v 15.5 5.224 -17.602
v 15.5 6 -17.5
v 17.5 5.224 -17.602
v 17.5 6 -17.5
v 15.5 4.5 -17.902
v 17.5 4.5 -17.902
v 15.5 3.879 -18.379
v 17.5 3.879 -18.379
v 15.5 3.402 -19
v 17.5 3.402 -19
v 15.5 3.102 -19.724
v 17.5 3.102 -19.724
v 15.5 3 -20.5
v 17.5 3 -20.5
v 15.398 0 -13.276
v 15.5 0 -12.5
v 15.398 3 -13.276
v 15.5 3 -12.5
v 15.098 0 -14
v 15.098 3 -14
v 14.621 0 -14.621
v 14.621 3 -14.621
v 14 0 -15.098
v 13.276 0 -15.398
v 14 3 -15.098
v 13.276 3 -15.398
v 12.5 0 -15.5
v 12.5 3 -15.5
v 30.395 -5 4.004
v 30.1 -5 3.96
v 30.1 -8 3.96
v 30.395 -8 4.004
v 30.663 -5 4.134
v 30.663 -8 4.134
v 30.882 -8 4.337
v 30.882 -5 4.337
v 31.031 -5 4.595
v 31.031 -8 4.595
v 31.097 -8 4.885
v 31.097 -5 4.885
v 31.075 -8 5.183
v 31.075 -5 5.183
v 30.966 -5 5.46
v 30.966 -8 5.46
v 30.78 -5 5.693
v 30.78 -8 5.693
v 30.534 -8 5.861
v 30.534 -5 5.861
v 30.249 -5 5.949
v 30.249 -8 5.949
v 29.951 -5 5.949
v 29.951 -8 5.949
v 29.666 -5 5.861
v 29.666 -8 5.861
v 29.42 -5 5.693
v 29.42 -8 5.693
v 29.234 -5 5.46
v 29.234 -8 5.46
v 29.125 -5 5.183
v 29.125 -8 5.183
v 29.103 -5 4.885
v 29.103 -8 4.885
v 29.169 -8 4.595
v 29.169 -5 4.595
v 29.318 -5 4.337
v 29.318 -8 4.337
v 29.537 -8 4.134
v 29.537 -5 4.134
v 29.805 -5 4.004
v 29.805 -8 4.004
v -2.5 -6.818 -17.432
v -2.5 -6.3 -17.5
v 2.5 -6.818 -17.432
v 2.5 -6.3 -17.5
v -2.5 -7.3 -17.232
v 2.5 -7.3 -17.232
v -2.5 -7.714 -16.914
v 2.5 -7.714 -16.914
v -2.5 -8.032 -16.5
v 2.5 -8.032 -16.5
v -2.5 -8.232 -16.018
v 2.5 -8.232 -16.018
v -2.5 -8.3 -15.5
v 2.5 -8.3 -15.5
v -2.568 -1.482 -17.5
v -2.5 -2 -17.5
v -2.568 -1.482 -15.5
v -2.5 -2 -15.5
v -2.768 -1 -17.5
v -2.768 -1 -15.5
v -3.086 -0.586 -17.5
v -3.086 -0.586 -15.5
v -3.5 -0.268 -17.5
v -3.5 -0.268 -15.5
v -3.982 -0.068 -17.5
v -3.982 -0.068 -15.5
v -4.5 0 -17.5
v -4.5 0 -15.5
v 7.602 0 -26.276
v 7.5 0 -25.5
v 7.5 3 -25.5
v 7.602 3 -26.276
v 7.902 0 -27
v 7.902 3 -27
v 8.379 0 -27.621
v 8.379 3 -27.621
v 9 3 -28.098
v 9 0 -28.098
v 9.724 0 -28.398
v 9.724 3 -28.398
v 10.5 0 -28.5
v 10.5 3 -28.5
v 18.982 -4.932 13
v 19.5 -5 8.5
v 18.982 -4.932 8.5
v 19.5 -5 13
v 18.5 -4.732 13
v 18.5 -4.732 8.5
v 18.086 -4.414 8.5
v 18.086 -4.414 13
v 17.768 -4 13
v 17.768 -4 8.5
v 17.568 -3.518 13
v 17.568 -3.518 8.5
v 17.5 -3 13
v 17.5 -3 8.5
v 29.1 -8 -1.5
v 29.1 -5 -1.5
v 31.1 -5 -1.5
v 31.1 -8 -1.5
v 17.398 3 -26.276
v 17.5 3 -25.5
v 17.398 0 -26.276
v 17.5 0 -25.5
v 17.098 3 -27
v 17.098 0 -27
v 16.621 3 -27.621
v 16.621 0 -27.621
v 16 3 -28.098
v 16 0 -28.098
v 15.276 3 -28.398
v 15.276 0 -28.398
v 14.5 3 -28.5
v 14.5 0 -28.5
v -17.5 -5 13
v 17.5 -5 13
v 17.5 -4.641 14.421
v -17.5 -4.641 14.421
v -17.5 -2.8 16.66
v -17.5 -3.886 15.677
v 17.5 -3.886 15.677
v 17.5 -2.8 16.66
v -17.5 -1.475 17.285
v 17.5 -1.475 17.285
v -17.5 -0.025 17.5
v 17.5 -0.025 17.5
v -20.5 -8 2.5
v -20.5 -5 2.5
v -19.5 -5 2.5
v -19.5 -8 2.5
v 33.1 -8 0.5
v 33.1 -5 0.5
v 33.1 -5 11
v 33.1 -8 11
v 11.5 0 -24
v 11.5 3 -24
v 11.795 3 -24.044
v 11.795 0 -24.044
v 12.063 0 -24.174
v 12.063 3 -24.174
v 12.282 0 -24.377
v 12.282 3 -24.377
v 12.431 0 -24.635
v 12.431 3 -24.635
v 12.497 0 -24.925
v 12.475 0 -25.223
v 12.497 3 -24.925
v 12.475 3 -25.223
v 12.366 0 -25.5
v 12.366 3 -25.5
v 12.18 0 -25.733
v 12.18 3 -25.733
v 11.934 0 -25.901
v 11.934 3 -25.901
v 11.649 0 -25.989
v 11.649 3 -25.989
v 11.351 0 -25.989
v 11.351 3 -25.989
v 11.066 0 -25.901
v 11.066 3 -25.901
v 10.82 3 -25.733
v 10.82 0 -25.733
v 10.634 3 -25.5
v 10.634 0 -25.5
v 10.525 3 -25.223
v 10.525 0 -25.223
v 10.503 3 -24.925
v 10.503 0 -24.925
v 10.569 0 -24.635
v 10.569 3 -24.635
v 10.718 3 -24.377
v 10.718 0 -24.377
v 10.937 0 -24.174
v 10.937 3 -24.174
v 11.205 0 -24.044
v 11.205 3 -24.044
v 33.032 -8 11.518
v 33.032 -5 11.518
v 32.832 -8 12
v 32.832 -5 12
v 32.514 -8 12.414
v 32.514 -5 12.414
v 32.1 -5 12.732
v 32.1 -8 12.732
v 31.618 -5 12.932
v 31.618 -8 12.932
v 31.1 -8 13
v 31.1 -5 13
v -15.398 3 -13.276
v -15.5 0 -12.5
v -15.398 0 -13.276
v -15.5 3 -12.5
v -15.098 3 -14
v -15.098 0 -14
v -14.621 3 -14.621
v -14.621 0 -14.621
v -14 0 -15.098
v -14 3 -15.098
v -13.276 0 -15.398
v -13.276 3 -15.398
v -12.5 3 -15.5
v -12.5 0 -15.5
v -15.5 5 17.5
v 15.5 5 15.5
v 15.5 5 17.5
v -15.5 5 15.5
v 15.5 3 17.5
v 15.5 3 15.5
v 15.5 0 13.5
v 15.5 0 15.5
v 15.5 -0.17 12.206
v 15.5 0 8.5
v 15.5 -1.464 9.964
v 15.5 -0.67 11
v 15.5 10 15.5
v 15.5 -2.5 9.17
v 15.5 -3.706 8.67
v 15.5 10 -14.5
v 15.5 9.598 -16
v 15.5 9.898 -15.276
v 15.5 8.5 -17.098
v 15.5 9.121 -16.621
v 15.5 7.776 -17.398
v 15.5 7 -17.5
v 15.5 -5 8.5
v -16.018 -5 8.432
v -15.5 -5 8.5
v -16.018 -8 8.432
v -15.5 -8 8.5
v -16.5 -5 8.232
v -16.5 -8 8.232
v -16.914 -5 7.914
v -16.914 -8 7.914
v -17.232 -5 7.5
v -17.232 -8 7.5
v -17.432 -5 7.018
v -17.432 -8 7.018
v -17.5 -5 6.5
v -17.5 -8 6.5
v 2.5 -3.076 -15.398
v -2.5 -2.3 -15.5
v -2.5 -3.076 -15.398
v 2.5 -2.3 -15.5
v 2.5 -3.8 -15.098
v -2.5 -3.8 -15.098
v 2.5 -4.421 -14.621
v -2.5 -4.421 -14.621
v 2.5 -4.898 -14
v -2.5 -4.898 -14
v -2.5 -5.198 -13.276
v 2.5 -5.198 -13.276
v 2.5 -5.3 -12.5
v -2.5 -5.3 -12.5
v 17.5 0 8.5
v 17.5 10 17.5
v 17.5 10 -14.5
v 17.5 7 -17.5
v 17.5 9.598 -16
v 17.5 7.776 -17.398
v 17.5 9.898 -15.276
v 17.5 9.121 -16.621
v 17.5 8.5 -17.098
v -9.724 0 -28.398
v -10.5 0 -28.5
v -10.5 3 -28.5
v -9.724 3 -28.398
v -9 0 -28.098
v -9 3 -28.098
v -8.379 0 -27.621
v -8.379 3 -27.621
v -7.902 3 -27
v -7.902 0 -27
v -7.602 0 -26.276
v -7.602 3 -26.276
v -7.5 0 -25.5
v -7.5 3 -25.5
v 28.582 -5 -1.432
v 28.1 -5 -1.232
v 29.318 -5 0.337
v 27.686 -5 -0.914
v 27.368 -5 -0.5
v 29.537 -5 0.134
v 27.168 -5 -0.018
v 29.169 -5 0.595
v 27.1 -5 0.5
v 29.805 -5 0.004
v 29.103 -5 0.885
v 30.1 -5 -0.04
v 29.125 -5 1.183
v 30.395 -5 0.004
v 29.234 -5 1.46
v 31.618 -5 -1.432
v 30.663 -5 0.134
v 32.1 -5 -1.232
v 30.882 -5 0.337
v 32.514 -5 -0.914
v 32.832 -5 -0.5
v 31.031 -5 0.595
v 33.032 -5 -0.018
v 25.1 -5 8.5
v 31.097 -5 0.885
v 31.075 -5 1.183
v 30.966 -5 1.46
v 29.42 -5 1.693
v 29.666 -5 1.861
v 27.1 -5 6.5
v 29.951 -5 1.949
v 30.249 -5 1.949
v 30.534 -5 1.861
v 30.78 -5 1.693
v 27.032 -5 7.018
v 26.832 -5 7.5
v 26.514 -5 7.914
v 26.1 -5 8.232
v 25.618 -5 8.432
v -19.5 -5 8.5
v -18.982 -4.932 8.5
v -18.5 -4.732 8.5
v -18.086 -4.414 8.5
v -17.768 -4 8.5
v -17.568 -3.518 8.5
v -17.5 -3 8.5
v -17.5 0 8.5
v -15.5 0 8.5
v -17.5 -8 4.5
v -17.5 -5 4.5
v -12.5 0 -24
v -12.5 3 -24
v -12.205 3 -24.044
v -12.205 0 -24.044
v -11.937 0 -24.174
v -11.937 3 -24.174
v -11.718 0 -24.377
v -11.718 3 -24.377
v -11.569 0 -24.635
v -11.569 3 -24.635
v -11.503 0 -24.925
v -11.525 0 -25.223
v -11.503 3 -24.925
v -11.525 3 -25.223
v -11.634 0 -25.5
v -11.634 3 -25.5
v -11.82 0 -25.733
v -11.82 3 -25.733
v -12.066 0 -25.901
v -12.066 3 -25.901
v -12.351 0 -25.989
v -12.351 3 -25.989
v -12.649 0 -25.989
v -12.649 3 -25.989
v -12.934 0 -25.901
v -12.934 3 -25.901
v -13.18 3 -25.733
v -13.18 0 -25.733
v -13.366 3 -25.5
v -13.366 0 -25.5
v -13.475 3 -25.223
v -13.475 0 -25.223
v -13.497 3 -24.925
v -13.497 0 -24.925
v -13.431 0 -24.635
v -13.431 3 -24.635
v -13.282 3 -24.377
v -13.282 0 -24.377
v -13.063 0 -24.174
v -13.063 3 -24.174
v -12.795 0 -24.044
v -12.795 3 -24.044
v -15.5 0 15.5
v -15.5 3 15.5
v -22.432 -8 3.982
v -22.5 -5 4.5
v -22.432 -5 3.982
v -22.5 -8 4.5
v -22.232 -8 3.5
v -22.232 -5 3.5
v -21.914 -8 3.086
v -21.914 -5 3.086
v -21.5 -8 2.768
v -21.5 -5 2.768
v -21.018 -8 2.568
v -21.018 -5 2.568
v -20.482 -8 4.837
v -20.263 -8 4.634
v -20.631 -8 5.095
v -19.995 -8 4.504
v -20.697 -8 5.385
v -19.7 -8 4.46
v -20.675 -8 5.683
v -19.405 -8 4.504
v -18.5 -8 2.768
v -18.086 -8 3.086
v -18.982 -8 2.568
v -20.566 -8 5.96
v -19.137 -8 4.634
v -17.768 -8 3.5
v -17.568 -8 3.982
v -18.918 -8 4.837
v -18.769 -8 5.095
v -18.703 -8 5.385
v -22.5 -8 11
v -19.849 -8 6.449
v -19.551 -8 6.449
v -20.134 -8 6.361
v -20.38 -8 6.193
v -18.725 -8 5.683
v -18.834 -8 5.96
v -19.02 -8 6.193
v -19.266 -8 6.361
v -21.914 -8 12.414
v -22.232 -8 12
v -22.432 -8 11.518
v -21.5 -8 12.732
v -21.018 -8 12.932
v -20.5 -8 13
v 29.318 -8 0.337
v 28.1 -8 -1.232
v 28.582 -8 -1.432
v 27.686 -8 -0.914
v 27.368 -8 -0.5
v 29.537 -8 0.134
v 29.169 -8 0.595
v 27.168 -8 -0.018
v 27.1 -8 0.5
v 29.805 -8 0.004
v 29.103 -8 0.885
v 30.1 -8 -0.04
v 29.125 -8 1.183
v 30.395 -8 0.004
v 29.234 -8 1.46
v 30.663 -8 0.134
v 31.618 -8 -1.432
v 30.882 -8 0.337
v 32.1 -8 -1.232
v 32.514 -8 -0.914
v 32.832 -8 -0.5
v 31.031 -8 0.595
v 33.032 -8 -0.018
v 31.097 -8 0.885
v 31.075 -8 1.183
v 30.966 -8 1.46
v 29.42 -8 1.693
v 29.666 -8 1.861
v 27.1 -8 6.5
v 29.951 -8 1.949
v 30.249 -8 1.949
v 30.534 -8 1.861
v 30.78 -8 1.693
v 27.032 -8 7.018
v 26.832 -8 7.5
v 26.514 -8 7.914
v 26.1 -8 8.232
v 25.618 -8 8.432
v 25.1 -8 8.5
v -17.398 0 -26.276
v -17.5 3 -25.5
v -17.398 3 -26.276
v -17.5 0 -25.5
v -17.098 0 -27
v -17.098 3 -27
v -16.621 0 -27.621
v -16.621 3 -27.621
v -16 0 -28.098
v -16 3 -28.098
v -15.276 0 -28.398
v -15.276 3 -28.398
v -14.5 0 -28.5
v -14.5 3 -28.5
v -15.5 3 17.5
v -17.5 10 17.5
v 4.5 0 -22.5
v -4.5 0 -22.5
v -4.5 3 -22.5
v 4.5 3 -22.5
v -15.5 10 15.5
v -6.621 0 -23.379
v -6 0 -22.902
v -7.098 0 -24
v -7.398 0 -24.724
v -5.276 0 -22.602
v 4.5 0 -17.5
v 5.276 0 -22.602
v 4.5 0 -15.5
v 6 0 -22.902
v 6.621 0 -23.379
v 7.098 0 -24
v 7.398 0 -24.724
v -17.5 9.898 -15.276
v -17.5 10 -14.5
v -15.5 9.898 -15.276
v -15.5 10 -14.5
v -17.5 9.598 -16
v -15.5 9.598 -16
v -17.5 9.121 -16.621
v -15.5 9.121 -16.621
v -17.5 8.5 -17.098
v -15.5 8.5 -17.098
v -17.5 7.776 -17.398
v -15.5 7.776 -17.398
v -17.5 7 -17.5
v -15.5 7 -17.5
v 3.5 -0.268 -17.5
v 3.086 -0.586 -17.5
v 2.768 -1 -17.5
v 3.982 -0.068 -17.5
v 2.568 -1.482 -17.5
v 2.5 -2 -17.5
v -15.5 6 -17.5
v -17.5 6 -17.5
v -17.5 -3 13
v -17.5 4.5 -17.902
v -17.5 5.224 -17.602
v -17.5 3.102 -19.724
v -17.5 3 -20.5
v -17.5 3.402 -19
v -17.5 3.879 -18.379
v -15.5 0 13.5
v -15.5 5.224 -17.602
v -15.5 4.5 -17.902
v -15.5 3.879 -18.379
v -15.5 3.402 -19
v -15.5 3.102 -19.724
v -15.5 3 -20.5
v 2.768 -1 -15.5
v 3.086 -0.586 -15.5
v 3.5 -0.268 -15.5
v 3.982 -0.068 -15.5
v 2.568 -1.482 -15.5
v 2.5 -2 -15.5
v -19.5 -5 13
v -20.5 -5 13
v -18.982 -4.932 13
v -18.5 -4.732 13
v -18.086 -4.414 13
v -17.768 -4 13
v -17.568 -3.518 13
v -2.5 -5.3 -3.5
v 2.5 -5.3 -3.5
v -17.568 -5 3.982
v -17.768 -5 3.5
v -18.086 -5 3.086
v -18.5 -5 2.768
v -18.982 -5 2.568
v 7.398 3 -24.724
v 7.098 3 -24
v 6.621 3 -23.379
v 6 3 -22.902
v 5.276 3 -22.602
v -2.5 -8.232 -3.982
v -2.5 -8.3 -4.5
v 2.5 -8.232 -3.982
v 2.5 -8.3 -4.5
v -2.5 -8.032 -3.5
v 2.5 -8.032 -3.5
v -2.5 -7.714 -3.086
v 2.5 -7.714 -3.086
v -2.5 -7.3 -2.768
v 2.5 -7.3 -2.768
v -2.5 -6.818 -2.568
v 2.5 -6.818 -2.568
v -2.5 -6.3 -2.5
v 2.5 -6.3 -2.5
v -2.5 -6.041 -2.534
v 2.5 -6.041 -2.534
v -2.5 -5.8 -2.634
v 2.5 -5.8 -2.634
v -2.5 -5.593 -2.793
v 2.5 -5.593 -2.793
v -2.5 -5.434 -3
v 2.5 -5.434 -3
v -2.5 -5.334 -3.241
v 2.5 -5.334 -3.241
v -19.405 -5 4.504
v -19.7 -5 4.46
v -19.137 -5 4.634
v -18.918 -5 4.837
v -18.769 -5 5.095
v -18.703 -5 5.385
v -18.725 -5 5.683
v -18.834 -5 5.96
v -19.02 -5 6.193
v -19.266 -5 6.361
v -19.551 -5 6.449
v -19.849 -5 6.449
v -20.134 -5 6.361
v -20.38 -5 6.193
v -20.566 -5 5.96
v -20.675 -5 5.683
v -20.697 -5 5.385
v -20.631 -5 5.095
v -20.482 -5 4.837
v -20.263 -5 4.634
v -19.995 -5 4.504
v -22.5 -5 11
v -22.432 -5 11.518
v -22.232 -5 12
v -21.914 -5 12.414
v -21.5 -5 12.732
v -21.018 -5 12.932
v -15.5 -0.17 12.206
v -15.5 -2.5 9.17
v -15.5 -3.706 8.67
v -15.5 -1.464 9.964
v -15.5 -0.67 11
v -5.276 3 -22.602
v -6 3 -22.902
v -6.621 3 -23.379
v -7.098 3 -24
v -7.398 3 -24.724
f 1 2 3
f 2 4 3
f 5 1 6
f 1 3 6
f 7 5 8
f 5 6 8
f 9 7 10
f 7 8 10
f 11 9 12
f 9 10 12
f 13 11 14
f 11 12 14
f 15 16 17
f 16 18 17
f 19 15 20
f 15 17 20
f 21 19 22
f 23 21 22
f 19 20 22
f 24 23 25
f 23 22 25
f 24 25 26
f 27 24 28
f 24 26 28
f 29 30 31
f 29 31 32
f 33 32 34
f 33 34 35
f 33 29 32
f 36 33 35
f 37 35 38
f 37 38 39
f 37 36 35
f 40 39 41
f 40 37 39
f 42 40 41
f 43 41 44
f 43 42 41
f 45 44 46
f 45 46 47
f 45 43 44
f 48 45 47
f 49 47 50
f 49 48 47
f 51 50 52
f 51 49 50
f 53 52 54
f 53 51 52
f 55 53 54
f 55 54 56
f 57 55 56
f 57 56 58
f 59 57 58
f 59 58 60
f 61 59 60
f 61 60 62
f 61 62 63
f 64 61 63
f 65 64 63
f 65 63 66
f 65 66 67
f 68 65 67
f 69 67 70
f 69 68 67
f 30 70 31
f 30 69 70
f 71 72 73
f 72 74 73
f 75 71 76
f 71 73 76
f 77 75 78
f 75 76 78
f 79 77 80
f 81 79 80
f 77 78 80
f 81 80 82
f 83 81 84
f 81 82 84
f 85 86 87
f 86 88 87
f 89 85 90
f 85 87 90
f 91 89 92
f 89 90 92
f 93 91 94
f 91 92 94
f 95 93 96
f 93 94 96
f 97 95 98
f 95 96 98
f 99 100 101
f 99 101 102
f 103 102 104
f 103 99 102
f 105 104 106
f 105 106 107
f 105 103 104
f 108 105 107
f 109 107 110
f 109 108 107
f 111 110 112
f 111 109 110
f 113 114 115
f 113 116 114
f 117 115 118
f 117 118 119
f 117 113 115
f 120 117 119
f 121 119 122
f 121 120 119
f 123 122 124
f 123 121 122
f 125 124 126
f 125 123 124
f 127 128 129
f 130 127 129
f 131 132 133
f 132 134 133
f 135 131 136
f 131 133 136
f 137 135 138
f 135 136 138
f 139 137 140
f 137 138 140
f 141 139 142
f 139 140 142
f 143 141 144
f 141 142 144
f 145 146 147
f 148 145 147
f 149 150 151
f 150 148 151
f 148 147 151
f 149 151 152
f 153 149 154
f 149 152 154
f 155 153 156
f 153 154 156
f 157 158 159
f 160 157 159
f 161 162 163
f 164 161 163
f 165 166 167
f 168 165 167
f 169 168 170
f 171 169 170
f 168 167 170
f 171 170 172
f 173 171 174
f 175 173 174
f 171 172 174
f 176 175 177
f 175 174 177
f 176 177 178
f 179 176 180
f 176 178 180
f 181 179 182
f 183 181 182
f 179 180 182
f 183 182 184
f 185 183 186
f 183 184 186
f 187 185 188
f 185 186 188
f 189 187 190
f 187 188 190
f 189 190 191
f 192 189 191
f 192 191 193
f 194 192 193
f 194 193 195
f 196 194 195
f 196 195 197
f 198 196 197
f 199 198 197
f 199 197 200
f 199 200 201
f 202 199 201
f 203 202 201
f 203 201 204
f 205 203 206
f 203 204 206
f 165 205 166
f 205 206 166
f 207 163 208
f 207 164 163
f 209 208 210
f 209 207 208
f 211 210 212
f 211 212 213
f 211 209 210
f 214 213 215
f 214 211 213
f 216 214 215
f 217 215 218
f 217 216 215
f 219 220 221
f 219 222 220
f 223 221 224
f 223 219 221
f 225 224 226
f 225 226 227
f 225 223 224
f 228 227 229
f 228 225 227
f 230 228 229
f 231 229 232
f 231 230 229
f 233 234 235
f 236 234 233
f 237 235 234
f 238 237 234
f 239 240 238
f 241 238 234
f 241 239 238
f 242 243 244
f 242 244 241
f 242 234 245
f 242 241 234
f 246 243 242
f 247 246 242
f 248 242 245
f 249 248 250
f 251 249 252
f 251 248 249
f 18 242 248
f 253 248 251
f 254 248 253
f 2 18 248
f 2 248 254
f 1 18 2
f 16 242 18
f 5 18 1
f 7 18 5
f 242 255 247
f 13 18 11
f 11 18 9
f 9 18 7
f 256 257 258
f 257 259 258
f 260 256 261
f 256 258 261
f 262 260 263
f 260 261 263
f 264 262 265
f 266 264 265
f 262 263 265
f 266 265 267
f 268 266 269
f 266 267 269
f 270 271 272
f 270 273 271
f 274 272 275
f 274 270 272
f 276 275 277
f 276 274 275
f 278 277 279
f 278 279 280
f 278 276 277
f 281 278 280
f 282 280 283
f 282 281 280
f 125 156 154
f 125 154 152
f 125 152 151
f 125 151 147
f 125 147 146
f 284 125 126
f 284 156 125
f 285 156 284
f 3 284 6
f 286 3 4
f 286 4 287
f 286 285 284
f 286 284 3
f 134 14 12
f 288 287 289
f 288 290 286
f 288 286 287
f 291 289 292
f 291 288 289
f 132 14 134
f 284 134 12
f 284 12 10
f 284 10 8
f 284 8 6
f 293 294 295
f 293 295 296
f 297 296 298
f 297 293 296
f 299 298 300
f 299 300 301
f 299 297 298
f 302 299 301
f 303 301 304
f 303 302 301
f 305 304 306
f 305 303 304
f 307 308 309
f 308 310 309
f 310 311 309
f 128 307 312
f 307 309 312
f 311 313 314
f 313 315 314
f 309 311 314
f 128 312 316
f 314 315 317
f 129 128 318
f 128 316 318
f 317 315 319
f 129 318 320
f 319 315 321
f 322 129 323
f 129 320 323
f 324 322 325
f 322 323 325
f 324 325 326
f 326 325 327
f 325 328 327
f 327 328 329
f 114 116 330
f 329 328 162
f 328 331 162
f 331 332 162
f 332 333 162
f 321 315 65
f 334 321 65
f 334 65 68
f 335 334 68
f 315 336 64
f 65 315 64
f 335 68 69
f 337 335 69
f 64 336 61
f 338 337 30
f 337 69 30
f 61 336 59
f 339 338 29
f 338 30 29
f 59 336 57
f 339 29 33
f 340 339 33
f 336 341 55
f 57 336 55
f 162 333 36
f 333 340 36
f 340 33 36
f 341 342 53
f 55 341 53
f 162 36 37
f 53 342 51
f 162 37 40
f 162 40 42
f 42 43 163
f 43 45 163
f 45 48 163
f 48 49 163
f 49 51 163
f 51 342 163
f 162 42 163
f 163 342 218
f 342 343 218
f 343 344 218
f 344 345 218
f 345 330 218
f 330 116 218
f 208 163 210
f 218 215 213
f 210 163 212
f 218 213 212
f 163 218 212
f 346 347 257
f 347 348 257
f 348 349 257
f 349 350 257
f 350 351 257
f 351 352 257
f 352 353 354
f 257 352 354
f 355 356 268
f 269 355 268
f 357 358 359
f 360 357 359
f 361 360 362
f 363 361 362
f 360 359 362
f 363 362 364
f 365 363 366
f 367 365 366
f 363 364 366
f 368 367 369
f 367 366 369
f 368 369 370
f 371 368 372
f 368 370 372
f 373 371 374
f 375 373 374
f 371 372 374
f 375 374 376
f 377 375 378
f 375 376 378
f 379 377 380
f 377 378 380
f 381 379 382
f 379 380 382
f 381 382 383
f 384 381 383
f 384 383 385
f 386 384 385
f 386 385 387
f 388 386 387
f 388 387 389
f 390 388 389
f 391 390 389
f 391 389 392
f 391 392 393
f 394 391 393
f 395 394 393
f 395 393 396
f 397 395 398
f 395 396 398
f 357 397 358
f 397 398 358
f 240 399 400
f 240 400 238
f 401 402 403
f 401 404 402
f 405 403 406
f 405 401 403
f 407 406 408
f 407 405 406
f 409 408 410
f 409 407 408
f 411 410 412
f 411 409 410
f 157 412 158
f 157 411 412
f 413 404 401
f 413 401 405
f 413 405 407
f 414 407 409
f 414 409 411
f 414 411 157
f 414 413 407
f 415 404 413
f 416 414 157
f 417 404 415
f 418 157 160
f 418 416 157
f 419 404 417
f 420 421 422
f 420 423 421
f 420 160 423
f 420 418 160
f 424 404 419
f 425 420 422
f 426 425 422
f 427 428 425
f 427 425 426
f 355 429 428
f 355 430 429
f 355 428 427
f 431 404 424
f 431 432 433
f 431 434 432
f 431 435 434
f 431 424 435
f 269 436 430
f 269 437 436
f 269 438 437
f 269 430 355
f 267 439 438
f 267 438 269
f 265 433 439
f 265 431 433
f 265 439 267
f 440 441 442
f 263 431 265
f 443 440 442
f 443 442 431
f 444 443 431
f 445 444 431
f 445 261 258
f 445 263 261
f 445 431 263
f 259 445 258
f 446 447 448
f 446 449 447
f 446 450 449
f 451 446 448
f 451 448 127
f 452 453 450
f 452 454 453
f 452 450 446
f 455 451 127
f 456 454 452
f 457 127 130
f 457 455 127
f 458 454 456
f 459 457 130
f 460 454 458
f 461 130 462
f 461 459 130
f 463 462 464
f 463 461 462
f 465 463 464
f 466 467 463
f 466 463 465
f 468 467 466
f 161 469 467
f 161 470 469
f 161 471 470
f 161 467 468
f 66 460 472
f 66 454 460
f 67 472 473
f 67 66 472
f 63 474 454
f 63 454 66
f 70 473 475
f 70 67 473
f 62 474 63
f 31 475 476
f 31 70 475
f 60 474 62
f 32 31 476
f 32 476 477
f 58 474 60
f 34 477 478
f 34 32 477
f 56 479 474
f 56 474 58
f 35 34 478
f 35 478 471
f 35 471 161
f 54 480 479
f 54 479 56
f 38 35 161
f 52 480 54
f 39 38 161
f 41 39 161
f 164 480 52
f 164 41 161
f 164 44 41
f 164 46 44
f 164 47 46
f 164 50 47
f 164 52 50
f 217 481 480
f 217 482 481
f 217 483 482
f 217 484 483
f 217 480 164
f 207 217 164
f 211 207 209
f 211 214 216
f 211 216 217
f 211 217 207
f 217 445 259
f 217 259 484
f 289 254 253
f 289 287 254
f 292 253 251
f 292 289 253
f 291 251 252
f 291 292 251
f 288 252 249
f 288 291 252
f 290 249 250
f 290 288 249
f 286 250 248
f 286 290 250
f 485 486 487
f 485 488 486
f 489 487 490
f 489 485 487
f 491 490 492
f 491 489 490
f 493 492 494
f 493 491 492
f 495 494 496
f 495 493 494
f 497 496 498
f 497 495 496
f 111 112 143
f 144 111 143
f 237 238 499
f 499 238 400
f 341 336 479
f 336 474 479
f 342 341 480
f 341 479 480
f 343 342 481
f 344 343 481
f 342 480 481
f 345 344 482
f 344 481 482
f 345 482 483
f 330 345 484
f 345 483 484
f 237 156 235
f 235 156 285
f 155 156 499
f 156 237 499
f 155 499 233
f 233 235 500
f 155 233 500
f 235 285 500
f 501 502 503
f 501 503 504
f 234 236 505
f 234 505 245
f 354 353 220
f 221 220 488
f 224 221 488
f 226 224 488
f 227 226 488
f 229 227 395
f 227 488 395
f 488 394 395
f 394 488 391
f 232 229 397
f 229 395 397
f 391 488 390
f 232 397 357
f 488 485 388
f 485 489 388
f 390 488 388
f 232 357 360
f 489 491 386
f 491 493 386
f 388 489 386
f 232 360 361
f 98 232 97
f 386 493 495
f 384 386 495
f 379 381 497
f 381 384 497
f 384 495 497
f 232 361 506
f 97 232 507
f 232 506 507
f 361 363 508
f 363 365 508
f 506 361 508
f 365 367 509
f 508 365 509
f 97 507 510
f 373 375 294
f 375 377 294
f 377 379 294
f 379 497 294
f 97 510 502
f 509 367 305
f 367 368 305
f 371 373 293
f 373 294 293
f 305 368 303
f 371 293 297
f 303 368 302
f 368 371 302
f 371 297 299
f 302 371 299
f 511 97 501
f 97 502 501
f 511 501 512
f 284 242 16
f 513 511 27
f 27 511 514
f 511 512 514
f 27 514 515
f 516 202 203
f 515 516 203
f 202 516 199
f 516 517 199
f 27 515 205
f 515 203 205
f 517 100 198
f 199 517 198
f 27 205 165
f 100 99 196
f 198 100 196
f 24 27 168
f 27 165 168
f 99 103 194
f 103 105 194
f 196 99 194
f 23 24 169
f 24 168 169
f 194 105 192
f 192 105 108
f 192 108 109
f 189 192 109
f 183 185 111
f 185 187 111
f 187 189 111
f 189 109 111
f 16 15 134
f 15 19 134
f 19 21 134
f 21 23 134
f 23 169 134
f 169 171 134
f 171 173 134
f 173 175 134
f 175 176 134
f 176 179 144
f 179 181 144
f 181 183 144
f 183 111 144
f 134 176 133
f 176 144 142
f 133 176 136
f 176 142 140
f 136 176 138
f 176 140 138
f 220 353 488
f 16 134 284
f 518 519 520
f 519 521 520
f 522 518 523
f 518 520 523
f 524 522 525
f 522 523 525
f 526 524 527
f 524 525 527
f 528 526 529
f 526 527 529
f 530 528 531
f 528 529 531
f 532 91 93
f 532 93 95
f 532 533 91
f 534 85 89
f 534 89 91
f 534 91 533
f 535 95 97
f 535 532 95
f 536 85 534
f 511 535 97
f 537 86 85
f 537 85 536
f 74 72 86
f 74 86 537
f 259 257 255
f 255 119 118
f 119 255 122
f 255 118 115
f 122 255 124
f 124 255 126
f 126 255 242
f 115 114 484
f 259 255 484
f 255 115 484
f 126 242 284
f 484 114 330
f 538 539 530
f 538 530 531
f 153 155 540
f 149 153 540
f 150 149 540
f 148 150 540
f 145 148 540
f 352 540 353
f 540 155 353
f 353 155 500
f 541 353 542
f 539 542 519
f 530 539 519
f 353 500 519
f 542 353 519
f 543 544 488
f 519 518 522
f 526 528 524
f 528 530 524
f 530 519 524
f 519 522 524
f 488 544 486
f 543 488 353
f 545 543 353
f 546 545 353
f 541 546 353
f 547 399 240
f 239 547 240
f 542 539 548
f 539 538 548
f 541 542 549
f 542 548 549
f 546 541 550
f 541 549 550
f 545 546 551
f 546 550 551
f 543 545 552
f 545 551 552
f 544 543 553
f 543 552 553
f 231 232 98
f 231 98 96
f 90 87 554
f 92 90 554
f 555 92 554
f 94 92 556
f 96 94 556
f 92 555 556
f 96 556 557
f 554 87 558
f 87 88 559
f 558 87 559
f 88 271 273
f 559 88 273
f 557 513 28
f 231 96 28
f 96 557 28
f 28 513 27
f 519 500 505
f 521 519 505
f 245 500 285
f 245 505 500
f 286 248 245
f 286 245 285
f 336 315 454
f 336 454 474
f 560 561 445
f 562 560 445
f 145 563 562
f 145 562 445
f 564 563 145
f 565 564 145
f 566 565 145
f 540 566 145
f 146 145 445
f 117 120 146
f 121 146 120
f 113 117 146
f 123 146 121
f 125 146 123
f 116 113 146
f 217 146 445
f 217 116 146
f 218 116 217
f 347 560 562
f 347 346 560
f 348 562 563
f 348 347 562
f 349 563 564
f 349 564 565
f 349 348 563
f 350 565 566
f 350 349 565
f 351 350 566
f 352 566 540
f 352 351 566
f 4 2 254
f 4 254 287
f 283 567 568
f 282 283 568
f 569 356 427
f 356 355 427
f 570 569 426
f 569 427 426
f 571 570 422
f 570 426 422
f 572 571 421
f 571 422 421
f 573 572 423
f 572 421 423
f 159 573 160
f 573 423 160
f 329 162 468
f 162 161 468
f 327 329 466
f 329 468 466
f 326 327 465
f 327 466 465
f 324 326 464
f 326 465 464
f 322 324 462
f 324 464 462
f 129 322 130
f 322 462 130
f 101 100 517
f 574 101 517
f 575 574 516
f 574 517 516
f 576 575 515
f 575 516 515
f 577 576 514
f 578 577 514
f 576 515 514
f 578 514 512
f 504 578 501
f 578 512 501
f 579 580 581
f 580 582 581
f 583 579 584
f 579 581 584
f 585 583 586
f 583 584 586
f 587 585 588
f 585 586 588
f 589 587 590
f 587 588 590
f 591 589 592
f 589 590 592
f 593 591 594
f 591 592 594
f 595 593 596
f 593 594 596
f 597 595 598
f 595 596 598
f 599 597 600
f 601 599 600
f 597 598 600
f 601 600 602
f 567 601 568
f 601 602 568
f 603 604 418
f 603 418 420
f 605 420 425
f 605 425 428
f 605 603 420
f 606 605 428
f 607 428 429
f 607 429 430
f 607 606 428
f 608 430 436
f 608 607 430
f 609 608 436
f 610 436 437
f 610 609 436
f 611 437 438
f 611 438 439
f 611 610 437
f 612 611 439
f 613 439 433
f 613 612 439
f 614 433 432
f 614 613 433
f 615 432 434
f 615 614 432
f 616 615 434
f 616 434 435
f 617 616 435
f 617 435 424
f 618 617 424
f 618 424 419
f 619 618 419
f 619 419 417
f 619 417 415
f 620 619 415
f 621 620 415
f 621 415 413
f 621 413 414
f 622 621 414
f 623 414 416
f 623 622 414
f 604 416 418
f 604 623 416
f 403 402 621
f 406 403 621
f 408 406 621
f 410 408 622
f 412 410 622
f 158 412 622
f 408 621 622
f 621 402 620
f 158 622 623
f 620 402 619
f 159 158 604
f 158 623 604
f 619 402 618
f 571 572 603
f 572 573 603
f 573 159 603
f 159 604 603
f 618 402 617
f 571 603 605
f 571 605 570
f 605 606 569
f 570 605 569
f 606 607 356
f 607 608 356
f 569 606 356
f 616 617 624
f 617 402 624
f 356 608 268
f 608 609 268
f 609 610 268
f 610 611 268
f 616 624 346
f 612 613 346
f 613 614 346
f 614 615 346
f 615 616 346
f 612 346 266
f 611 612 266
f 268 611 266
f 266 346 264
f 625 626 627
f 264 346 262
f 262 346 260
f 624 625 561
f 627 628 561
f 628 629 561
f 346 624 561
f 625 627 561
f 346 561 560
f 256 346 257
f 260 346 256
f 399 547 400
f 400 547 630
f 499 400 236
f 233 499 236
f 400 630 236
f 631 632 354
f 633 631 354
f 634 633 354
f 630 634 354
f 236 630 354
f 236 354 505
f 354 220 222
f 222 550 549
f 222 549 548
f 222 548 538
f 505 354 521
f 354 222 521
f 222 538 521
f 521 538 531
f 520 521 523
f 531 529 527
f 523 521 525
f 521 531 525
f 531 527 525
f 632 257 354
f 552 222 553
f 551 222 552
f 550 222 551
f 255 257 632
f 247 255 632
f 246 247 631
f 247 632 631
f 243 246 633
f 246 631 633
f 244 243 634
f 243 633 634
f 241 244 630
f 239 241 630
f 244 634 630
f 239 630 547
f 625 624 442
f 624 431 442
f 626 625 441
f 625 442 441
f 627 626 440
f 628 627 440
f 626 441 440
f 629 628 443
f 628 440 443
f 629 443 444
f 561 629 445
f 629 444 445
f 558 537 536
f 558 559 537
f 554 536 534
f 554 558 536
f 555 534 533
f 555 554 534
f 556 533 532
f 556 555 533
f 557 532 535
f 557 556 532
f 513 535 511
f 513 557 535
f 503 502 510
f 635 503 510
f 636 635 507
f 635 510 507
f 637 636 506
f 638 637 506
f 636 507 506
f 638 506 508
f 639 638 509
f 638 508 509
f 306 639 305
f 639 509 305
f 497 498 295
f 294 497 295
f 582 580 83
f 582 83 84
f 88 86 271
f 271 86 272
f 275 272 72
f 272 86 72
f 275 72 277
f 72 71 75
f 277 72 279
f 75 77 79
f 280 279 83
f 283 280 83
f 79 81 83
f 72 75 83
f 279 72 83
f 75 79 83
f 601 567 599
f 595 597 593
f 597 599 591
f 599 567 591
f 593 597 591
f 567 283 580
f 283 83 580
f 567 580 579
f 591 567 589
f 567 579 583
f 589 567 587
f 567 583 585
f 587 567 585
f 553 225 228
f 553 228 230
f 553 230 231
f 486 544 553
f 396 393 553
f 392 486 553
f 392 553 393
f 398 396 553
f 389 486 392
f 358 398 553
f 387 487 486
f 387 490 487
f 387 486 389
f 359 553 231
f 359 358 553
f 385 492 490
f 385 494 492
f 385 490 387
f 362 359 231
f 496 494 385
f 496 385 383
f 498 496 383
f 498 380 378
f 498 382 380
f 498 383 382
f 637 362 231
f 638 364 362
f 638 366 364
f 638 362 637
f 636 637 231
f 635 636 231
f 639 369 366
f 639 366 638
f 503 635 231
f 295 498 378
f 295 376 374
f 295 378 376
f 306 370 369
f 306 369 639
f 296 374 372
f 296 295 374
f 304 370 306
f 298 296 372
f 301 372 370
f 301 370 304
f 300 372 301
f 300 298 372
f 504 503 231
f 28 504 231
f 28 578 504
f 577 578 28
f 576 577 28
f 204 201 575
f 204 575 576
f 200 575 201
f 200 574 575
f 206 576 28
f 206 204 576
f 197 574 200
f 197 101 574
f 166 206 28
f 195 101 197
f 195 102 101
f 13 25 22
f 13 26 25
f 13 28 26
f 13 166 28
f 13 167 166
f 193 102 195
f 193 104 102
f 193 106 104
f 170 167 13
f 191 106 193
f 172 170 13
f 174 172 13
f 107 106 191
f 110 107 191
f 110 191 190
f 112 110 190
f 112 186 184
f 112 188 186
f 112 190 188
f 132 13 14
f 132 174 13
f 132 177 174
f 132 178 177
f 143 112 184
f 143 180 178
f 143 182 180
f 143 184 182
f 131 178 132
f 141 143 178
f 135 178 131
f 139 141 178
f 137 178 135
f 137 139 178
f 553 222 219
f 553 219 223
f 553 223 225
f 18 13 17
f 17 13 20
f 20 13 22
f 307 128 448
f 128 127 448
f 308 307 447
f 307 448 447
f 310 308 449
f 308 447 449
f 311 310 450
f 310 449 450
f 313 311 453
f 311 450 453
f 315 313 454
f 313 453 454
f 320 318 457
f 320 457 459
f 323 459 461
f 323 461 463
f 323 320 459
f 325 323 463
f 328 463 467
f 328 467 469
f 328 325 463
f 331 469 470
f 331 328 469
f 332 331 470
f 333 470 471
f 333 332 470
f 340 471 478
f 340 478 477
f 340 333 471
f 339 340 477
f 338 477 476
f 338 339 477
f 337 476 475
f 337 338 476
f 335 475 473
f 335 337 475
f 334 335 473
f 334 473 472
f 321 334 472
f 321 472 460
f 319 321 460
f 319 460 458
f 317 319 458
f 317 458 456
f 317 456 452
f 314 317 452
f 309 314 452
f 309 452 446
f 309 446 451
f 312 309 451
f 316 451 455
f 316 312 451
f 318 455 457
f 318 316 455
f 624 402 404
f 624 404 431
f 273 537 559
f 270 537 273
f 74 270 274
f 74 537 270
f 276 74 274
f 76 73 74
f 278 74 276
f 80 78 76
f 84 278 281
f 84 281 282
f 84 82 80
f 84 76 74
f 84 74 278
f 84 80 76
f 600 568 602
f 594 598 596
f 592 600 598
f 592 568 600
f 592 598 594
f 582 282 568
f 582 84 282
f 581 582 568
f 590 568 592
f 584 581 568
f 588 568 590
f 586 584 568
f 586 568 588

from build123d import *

# Parameters (mm, degrees)
SKETCH_1_W          = 35
SKETCH_1_H          = 35
SKETCH_1_W_2        = 31
SKETCH_1_H_2        = 31
EXTRUDE_1_DEPTH     = 10
EXTRUDE_2_DEPTH     = 5
SKETCH_3_W          = 31
SKETCH_3_H          = 7
CUT_EXTRUDE_1_DEPTH = 3
SKETCH_4_W          = 5
SKETCH_4_H          = 4.5
SKETCH_4_W_2        = 35
SKETCH_4_H_2        = 6
SKETCH_4_R          = 1
SKETCH_4_W_3        = 6
SKETCH_4_H_3        = 10
EXTRUDE_3_DEPTH     = 3
FILLET_2_R          = 2
FILLET_3_R          = 2
SKETCH_5_W          = 5
SKETCH_5_H          = 2
EXTRUDE_4_DEPTH     = 8.3
SKETCH_6_W          = 5
SKETCH_6_H          = 13
EXTRUDE_5_DEPTH     = 3
FILLET_4_R          = 2
FILLET_5_R          = 1
FILLET_6_R          = 2
SKETCH_7_W          = 31
SKETCH_7_H          = 2
CUT_EXTRUDE_2_DEPTH = 10
FILLET_7_R          = 5
SKETCH_8_W          = 35
SKETCH_8_H          = 11
SKETCH_8_R          = 1
EXTRUDE_6_DEPTH     = 3
FILLET_8_R          = 3
FILLET_9_R          = 3
SKETCH_11_W         = 15
SKETCH_11_H         = 6
CUT_EXTRUDE_4_DEPTH = 3
FILLET_START        = -1
FILLET_10_DEPTH     = 4
FILLET_10_2_DEPTH   = 3
FILLET_11_R         = 3


with BuildPart() as part:
    # 草图1 → 凸台-拉伸1 (new body)
    with BuildSketch(Plane(origin=(0, 0, 0), x_dir=(1, 0, 0), z_dir=(0, 1, 0))):
        Rectangle(SKETCH_1_W, SKETCH_1_H)
        Rectangle(SKETCH_1_W_2, SKETCH_1_H_2, mode=Mode.SUBTRACT)
    extrude(amount=EXTRUDE_1_DEPTH)

    # 草图2 → 凸台-拉伸2 (add)
    with BuildSketch(Plane.XZ):
        Polygon((15.5, 8.5), (17.5, 8.5), (17.5, 17.5), (-17.5, 17.5), (-17.5, 8.5), align=None)
    extrude(amount=EXTRUDE_2_DEPTH)

    # 草图3 → 切除-拉伸1 (cut)
    with BuildSketch(Plane(origin=(0, 0, -17.5), x_dir=(-1, 0, 0), z_dir=(0, 0, -1))):
        with Locations((0, 6.5)):
            Rectangle(SKETCH_3_W, SKETCH_3_H)
    extrude(amount=-CUT_EXTRUDE_1_DEPTH, mode=Mode.SUBTRACT)

    # 草图4 → 凸台-拉伸3 (add)
    # profile 1 of 5: a face of its own
    with BuildSketch(Plane.XZ.offset(5)):
        with Locations((-20, 10.75)):
            Rectangle(SKETCH_4_W, SKETCH_4_H)
    # profile 2 of 5: a face of its own
    with BuildSketch(Plane.XZ.offset(5)):
        with Locations((0, 10.75)):
            Rectangle(SKETCH_4_W_2, SKETCH_4_H)
    # profile 3 of 5: a face of its own
    with BuildSketch(Plane.XZ.offset(5)):
        with Locations((-20, 5.5)):
            Rectangle(SKETCH_4_W, SKETCH_4_H_2)
        with Locations(Location((-19.7, 5.46, 0), (0, 0, 270))):
            Circle(SKETCH_4_R, mode=Mode.SUBTRACT)
    # profile 4 of 5: a face of its own
    with BuildSketch(Plane.XZ.offset(5)):
        Polygon((17.5, 13), (17.5, 8.5), (27.1, 8.5), (33.1, 8.5), (33.1, 13), align=None)
    # profile 5 of 5: a face of its own
    with BuildSketch(Plane.XZ.offset(5)):
        with Locations((30.1, 3.5)):
            Rectangle(SKETCH_4_W_3, SKETCH_4_H_3)
        with Locations(Location((30.1, 0.96, 0), (0, 0, 270))):
            Circle(SKETCH_4_R, mode=Mode.SUBTRACT)
        with Locations(Location((30.1, 4.96, 0), (0, 0, 270))):
            Circle(SKETCH_4_R, mode=Mode.SUBTRACT)
    extrude(amount=EXTRUDE_3_DEPTH)

    # 圆角2
    fillet_2_edges = [part.edges().sort_by_distance(p)[0] for p in [
        (-22.5, -6.5, 13),
        (-22.5, -6.5, 2.5),
        (-17.5, -6.5, 2.5),
        (-17.5, -6.5, 8.5),
        (27.1, -6.5, 8.5),
        (27.1, -6.5, -1.5),
        (33.1, -6.5, -1.5),
        (33.1, -6.5, 13),
    ]]
    fillet(fillet_2_edges, radius=FILLET_2_R)

    # 圆角3
    fillet_3_edges = [part.edges().sort_by_distance(p)[0] for p in [
        (17.5, -5, 10.75),
        (-17.5, -5, 10.75),
    ]]
    fillet(fillet_3_edges, radius=FILLET_3_R)

    # 草图5 → 凸台-拉伸4 (add)
    with BuildSketch(Plane.XZ):
        with Locations((0, -16.5)):
            Rectangle(SKETCH_5_W, SKETCH_5_H)
    extrude(amount=EXTRUDE_4_DEPTH)

    # 草图6 → 凸台-拉伸5 (add)
    with BuildSketch(Plane.XZ.offset(8.3)):
        with Locations((0, -9)):
            Rectangle(SKETCH_6_W, SKETCH_6_H)
    extrude(amount=-EXTRUDE_5_DEPTH)

    # 圆角4
    fillet_4_edges = [part.edges().sort_by_distance(p)[0] for p in [
        (0, -8.3, -17.5),
        (0, -8.3, -2.5),
    ]]
    fillet(fillet_4_edges, radius=FILLET_4_R)

    # 圆角5
    fillet_5_edges = [part.edges().sort_by_distance(p)[0] for p in [
        (0, -5.3, -2.5),
    ]]
    fillet(fillet_5_edges, radius=FILLET_5_R - 0.0001)  # a hair under: the kernel refuses the full size

    # 圆角6
    fillet_6_edges = [part.edges().sort_by_distance(p)[0] for p in [
        (2.5, 0, -16.5),
        (-2.5, 0, -16.5),
    ]]
    fillet(fillet_6_edges, radius=FILLET_6_R)

    # 草图7 → 切除-拉伸2 (cut)
    with BuildSketch(Plane(origin=(0, 0, 15.5), x_dir=(-1, 0, 0), z_dir=(0, 0, -1))):
        with Locations((0, 4)):
            Rectangle(SKETCH_7_W, SKETCH_7_H)
    extrude(amount=-CUT_EXTRUDE_2_DEPTH, mode=Mode.SUBTRACT)

    # 圆角7
    # the kernel refuses this fillet: 5 mm, written as the material it takes off along each edge
    with BuildSketch(Plane(origin=(-15.5, 0, 8.5), x_dir=(0, -1, 0), z_dir=(1, 0, 0))) as fillet_7_piece_1:
        with BuildLine():
            CenterArc((FILLET_7_R, -FILLET_7_R), FILLET_7_R, 90, 90)
            Line((0, -FILLET_7_R), (0, 0))
            Line((0, 0), (FILLET_7_R, 0))
        make_face()
    extrude(amount=31, mode=Mode.SUBTRACT)
    with BuildSketch(Plane(origin=(29.937342964, -5, 17.5), x_dir=(0, 0, -1), z_dir=(-1, 0, 0))) as fillet_7_piece_2:
        with BuildLine():
            CenterArc((5, -4.974937186), FILLET_7_R, 95.739170477, 84.260829523)
            Line((0, -4.974937186), (0, 0))
            Line((0, 0), (4.5, 0))
        make_face()
    extrude(amount=59.874685928, mode=Mode.SUBTRACT)

    # 草图8 → 凸台-拉伸6 (add)
    with BuildSketch(Plane(origin=(0, 3, 0), x_dir=(1, 0, 0), z_dir=(0, 1, 0))):
        with Locations((0, 23)):
            Rectangle(SKETCH_8_W, SKETCH_8_H)
        with Locations(Location((11.5, 25, 0), (0, 0, 270))):
            Circle(SKETCH_8_R, mode=Mode.SUBTRACT)
        with Locations(Location((-12.5, 25, 0), (0, 0, 270))):
            Circle(SKETCH_8_R, mode=Mode.SUBTRACT)
    extrude(amount=-EXTRUDE_6_DEPTH)

    # 圆角8
    fillet_8_edges = [part.edges().sort_by_distance(p)[0] for p in [
        (16.5, 3, -17.5),
        (-16.5, 3, -17.5),
        (-17.5, 1.5, -28.5),
        (17.5, 1.5, -28.5),
        (-16.5, 10, -17.5),
        (16.5, 10, -17.5),
    ]]
    fillet(fillet_8_edges, radius=FILLET_8_R)

    # 圆角9
    fillet_9_edges = [part.edges().sort_by_distance(p)[0] for p in [
        (-15.5, 1.5, -15.5),
        (15.5, 1.5, -15.5),
    ]]
    fillet(fillet_9_edges, radius=FILLET_9_R)

    # 草图11 → 切除-拉伸4 (cut)
    with BuildSketch(Plane.XZ):
        with Locations((0, -25.5)):
            Rectangle(SKETCH_11_W, SKETCH_11_H)
    extrude(amount=-CUT_EXTRUDE_4_DEPTH, mode=Mode.SUBTRACT)

    # 圆角10: read off the stored shape, not the designer's step
    # 圆角10 outline → 圆角10 (cut)
    with BuildSketch(Plane(origin=(0, 0, 0), x_dir=(1, 0, 0), z_dir=(0, 1, 0)).offset(FILLET_START)):
        with BuildLine():
            Line((7.5, 28.5), (7.5, 25.5))
            ThreePointArc((7.5, 25.5), (8.378679656, 27.621320344), (10.5, 28.5))
            Line((10.5, 28.5), (7.5, 28.5))
        make_face()
        with BuildLine():
            ThreePointArc((-10.5, 28.5), (-8.378679656, 27.621320344), (-7.5, 25.5))
            Line((-7.5, 25.5), (-7.5, 28.5))
            Line((-7.5, 28.5), (-10.5, 28.5))
        make_face()
    extrude(amount=FILLET_10_DEPTH, mode=Mode.SUBTRACT)

    # Fillet 10 2 outline → Fillet 10 2 (add)
    with BuildSketch(Plane(origin=(0, 0, 0), x_dir=(1, 0, 0), z_dir=(0, 1, 0))):
        with BuildLine():
            Line((-7.5, 22.5), (-4.5, 22.5))
            ThreePointArc((-4.5, 22.5), (-6.621320344, 23.378679656), (-7.5, 25.5))
            Line((-7.5, 25.5), (-7.5, 22.5))
        make_face()
        with BuildLine():
            ThreePointArc((7.5, 25.5), (6.621320344, 23.378679656), (4.5, 22.5))
            Line((4.5, 22.5), (7.5, 22.5))
            Line((7.5, 22.5), (7.5, 25.5))
        make_face()
    extrude(amount=FILLET_10_2_DEPTH)

    # 圆角11
    fillet_11_edges = [part.edges().sort_by_distance(p)[0] for p in [
        (0, -5.3, -15.5),
    ]]
    fillet(fillet_11_edges, radius=FILLET_11_R)


solid = part.part
